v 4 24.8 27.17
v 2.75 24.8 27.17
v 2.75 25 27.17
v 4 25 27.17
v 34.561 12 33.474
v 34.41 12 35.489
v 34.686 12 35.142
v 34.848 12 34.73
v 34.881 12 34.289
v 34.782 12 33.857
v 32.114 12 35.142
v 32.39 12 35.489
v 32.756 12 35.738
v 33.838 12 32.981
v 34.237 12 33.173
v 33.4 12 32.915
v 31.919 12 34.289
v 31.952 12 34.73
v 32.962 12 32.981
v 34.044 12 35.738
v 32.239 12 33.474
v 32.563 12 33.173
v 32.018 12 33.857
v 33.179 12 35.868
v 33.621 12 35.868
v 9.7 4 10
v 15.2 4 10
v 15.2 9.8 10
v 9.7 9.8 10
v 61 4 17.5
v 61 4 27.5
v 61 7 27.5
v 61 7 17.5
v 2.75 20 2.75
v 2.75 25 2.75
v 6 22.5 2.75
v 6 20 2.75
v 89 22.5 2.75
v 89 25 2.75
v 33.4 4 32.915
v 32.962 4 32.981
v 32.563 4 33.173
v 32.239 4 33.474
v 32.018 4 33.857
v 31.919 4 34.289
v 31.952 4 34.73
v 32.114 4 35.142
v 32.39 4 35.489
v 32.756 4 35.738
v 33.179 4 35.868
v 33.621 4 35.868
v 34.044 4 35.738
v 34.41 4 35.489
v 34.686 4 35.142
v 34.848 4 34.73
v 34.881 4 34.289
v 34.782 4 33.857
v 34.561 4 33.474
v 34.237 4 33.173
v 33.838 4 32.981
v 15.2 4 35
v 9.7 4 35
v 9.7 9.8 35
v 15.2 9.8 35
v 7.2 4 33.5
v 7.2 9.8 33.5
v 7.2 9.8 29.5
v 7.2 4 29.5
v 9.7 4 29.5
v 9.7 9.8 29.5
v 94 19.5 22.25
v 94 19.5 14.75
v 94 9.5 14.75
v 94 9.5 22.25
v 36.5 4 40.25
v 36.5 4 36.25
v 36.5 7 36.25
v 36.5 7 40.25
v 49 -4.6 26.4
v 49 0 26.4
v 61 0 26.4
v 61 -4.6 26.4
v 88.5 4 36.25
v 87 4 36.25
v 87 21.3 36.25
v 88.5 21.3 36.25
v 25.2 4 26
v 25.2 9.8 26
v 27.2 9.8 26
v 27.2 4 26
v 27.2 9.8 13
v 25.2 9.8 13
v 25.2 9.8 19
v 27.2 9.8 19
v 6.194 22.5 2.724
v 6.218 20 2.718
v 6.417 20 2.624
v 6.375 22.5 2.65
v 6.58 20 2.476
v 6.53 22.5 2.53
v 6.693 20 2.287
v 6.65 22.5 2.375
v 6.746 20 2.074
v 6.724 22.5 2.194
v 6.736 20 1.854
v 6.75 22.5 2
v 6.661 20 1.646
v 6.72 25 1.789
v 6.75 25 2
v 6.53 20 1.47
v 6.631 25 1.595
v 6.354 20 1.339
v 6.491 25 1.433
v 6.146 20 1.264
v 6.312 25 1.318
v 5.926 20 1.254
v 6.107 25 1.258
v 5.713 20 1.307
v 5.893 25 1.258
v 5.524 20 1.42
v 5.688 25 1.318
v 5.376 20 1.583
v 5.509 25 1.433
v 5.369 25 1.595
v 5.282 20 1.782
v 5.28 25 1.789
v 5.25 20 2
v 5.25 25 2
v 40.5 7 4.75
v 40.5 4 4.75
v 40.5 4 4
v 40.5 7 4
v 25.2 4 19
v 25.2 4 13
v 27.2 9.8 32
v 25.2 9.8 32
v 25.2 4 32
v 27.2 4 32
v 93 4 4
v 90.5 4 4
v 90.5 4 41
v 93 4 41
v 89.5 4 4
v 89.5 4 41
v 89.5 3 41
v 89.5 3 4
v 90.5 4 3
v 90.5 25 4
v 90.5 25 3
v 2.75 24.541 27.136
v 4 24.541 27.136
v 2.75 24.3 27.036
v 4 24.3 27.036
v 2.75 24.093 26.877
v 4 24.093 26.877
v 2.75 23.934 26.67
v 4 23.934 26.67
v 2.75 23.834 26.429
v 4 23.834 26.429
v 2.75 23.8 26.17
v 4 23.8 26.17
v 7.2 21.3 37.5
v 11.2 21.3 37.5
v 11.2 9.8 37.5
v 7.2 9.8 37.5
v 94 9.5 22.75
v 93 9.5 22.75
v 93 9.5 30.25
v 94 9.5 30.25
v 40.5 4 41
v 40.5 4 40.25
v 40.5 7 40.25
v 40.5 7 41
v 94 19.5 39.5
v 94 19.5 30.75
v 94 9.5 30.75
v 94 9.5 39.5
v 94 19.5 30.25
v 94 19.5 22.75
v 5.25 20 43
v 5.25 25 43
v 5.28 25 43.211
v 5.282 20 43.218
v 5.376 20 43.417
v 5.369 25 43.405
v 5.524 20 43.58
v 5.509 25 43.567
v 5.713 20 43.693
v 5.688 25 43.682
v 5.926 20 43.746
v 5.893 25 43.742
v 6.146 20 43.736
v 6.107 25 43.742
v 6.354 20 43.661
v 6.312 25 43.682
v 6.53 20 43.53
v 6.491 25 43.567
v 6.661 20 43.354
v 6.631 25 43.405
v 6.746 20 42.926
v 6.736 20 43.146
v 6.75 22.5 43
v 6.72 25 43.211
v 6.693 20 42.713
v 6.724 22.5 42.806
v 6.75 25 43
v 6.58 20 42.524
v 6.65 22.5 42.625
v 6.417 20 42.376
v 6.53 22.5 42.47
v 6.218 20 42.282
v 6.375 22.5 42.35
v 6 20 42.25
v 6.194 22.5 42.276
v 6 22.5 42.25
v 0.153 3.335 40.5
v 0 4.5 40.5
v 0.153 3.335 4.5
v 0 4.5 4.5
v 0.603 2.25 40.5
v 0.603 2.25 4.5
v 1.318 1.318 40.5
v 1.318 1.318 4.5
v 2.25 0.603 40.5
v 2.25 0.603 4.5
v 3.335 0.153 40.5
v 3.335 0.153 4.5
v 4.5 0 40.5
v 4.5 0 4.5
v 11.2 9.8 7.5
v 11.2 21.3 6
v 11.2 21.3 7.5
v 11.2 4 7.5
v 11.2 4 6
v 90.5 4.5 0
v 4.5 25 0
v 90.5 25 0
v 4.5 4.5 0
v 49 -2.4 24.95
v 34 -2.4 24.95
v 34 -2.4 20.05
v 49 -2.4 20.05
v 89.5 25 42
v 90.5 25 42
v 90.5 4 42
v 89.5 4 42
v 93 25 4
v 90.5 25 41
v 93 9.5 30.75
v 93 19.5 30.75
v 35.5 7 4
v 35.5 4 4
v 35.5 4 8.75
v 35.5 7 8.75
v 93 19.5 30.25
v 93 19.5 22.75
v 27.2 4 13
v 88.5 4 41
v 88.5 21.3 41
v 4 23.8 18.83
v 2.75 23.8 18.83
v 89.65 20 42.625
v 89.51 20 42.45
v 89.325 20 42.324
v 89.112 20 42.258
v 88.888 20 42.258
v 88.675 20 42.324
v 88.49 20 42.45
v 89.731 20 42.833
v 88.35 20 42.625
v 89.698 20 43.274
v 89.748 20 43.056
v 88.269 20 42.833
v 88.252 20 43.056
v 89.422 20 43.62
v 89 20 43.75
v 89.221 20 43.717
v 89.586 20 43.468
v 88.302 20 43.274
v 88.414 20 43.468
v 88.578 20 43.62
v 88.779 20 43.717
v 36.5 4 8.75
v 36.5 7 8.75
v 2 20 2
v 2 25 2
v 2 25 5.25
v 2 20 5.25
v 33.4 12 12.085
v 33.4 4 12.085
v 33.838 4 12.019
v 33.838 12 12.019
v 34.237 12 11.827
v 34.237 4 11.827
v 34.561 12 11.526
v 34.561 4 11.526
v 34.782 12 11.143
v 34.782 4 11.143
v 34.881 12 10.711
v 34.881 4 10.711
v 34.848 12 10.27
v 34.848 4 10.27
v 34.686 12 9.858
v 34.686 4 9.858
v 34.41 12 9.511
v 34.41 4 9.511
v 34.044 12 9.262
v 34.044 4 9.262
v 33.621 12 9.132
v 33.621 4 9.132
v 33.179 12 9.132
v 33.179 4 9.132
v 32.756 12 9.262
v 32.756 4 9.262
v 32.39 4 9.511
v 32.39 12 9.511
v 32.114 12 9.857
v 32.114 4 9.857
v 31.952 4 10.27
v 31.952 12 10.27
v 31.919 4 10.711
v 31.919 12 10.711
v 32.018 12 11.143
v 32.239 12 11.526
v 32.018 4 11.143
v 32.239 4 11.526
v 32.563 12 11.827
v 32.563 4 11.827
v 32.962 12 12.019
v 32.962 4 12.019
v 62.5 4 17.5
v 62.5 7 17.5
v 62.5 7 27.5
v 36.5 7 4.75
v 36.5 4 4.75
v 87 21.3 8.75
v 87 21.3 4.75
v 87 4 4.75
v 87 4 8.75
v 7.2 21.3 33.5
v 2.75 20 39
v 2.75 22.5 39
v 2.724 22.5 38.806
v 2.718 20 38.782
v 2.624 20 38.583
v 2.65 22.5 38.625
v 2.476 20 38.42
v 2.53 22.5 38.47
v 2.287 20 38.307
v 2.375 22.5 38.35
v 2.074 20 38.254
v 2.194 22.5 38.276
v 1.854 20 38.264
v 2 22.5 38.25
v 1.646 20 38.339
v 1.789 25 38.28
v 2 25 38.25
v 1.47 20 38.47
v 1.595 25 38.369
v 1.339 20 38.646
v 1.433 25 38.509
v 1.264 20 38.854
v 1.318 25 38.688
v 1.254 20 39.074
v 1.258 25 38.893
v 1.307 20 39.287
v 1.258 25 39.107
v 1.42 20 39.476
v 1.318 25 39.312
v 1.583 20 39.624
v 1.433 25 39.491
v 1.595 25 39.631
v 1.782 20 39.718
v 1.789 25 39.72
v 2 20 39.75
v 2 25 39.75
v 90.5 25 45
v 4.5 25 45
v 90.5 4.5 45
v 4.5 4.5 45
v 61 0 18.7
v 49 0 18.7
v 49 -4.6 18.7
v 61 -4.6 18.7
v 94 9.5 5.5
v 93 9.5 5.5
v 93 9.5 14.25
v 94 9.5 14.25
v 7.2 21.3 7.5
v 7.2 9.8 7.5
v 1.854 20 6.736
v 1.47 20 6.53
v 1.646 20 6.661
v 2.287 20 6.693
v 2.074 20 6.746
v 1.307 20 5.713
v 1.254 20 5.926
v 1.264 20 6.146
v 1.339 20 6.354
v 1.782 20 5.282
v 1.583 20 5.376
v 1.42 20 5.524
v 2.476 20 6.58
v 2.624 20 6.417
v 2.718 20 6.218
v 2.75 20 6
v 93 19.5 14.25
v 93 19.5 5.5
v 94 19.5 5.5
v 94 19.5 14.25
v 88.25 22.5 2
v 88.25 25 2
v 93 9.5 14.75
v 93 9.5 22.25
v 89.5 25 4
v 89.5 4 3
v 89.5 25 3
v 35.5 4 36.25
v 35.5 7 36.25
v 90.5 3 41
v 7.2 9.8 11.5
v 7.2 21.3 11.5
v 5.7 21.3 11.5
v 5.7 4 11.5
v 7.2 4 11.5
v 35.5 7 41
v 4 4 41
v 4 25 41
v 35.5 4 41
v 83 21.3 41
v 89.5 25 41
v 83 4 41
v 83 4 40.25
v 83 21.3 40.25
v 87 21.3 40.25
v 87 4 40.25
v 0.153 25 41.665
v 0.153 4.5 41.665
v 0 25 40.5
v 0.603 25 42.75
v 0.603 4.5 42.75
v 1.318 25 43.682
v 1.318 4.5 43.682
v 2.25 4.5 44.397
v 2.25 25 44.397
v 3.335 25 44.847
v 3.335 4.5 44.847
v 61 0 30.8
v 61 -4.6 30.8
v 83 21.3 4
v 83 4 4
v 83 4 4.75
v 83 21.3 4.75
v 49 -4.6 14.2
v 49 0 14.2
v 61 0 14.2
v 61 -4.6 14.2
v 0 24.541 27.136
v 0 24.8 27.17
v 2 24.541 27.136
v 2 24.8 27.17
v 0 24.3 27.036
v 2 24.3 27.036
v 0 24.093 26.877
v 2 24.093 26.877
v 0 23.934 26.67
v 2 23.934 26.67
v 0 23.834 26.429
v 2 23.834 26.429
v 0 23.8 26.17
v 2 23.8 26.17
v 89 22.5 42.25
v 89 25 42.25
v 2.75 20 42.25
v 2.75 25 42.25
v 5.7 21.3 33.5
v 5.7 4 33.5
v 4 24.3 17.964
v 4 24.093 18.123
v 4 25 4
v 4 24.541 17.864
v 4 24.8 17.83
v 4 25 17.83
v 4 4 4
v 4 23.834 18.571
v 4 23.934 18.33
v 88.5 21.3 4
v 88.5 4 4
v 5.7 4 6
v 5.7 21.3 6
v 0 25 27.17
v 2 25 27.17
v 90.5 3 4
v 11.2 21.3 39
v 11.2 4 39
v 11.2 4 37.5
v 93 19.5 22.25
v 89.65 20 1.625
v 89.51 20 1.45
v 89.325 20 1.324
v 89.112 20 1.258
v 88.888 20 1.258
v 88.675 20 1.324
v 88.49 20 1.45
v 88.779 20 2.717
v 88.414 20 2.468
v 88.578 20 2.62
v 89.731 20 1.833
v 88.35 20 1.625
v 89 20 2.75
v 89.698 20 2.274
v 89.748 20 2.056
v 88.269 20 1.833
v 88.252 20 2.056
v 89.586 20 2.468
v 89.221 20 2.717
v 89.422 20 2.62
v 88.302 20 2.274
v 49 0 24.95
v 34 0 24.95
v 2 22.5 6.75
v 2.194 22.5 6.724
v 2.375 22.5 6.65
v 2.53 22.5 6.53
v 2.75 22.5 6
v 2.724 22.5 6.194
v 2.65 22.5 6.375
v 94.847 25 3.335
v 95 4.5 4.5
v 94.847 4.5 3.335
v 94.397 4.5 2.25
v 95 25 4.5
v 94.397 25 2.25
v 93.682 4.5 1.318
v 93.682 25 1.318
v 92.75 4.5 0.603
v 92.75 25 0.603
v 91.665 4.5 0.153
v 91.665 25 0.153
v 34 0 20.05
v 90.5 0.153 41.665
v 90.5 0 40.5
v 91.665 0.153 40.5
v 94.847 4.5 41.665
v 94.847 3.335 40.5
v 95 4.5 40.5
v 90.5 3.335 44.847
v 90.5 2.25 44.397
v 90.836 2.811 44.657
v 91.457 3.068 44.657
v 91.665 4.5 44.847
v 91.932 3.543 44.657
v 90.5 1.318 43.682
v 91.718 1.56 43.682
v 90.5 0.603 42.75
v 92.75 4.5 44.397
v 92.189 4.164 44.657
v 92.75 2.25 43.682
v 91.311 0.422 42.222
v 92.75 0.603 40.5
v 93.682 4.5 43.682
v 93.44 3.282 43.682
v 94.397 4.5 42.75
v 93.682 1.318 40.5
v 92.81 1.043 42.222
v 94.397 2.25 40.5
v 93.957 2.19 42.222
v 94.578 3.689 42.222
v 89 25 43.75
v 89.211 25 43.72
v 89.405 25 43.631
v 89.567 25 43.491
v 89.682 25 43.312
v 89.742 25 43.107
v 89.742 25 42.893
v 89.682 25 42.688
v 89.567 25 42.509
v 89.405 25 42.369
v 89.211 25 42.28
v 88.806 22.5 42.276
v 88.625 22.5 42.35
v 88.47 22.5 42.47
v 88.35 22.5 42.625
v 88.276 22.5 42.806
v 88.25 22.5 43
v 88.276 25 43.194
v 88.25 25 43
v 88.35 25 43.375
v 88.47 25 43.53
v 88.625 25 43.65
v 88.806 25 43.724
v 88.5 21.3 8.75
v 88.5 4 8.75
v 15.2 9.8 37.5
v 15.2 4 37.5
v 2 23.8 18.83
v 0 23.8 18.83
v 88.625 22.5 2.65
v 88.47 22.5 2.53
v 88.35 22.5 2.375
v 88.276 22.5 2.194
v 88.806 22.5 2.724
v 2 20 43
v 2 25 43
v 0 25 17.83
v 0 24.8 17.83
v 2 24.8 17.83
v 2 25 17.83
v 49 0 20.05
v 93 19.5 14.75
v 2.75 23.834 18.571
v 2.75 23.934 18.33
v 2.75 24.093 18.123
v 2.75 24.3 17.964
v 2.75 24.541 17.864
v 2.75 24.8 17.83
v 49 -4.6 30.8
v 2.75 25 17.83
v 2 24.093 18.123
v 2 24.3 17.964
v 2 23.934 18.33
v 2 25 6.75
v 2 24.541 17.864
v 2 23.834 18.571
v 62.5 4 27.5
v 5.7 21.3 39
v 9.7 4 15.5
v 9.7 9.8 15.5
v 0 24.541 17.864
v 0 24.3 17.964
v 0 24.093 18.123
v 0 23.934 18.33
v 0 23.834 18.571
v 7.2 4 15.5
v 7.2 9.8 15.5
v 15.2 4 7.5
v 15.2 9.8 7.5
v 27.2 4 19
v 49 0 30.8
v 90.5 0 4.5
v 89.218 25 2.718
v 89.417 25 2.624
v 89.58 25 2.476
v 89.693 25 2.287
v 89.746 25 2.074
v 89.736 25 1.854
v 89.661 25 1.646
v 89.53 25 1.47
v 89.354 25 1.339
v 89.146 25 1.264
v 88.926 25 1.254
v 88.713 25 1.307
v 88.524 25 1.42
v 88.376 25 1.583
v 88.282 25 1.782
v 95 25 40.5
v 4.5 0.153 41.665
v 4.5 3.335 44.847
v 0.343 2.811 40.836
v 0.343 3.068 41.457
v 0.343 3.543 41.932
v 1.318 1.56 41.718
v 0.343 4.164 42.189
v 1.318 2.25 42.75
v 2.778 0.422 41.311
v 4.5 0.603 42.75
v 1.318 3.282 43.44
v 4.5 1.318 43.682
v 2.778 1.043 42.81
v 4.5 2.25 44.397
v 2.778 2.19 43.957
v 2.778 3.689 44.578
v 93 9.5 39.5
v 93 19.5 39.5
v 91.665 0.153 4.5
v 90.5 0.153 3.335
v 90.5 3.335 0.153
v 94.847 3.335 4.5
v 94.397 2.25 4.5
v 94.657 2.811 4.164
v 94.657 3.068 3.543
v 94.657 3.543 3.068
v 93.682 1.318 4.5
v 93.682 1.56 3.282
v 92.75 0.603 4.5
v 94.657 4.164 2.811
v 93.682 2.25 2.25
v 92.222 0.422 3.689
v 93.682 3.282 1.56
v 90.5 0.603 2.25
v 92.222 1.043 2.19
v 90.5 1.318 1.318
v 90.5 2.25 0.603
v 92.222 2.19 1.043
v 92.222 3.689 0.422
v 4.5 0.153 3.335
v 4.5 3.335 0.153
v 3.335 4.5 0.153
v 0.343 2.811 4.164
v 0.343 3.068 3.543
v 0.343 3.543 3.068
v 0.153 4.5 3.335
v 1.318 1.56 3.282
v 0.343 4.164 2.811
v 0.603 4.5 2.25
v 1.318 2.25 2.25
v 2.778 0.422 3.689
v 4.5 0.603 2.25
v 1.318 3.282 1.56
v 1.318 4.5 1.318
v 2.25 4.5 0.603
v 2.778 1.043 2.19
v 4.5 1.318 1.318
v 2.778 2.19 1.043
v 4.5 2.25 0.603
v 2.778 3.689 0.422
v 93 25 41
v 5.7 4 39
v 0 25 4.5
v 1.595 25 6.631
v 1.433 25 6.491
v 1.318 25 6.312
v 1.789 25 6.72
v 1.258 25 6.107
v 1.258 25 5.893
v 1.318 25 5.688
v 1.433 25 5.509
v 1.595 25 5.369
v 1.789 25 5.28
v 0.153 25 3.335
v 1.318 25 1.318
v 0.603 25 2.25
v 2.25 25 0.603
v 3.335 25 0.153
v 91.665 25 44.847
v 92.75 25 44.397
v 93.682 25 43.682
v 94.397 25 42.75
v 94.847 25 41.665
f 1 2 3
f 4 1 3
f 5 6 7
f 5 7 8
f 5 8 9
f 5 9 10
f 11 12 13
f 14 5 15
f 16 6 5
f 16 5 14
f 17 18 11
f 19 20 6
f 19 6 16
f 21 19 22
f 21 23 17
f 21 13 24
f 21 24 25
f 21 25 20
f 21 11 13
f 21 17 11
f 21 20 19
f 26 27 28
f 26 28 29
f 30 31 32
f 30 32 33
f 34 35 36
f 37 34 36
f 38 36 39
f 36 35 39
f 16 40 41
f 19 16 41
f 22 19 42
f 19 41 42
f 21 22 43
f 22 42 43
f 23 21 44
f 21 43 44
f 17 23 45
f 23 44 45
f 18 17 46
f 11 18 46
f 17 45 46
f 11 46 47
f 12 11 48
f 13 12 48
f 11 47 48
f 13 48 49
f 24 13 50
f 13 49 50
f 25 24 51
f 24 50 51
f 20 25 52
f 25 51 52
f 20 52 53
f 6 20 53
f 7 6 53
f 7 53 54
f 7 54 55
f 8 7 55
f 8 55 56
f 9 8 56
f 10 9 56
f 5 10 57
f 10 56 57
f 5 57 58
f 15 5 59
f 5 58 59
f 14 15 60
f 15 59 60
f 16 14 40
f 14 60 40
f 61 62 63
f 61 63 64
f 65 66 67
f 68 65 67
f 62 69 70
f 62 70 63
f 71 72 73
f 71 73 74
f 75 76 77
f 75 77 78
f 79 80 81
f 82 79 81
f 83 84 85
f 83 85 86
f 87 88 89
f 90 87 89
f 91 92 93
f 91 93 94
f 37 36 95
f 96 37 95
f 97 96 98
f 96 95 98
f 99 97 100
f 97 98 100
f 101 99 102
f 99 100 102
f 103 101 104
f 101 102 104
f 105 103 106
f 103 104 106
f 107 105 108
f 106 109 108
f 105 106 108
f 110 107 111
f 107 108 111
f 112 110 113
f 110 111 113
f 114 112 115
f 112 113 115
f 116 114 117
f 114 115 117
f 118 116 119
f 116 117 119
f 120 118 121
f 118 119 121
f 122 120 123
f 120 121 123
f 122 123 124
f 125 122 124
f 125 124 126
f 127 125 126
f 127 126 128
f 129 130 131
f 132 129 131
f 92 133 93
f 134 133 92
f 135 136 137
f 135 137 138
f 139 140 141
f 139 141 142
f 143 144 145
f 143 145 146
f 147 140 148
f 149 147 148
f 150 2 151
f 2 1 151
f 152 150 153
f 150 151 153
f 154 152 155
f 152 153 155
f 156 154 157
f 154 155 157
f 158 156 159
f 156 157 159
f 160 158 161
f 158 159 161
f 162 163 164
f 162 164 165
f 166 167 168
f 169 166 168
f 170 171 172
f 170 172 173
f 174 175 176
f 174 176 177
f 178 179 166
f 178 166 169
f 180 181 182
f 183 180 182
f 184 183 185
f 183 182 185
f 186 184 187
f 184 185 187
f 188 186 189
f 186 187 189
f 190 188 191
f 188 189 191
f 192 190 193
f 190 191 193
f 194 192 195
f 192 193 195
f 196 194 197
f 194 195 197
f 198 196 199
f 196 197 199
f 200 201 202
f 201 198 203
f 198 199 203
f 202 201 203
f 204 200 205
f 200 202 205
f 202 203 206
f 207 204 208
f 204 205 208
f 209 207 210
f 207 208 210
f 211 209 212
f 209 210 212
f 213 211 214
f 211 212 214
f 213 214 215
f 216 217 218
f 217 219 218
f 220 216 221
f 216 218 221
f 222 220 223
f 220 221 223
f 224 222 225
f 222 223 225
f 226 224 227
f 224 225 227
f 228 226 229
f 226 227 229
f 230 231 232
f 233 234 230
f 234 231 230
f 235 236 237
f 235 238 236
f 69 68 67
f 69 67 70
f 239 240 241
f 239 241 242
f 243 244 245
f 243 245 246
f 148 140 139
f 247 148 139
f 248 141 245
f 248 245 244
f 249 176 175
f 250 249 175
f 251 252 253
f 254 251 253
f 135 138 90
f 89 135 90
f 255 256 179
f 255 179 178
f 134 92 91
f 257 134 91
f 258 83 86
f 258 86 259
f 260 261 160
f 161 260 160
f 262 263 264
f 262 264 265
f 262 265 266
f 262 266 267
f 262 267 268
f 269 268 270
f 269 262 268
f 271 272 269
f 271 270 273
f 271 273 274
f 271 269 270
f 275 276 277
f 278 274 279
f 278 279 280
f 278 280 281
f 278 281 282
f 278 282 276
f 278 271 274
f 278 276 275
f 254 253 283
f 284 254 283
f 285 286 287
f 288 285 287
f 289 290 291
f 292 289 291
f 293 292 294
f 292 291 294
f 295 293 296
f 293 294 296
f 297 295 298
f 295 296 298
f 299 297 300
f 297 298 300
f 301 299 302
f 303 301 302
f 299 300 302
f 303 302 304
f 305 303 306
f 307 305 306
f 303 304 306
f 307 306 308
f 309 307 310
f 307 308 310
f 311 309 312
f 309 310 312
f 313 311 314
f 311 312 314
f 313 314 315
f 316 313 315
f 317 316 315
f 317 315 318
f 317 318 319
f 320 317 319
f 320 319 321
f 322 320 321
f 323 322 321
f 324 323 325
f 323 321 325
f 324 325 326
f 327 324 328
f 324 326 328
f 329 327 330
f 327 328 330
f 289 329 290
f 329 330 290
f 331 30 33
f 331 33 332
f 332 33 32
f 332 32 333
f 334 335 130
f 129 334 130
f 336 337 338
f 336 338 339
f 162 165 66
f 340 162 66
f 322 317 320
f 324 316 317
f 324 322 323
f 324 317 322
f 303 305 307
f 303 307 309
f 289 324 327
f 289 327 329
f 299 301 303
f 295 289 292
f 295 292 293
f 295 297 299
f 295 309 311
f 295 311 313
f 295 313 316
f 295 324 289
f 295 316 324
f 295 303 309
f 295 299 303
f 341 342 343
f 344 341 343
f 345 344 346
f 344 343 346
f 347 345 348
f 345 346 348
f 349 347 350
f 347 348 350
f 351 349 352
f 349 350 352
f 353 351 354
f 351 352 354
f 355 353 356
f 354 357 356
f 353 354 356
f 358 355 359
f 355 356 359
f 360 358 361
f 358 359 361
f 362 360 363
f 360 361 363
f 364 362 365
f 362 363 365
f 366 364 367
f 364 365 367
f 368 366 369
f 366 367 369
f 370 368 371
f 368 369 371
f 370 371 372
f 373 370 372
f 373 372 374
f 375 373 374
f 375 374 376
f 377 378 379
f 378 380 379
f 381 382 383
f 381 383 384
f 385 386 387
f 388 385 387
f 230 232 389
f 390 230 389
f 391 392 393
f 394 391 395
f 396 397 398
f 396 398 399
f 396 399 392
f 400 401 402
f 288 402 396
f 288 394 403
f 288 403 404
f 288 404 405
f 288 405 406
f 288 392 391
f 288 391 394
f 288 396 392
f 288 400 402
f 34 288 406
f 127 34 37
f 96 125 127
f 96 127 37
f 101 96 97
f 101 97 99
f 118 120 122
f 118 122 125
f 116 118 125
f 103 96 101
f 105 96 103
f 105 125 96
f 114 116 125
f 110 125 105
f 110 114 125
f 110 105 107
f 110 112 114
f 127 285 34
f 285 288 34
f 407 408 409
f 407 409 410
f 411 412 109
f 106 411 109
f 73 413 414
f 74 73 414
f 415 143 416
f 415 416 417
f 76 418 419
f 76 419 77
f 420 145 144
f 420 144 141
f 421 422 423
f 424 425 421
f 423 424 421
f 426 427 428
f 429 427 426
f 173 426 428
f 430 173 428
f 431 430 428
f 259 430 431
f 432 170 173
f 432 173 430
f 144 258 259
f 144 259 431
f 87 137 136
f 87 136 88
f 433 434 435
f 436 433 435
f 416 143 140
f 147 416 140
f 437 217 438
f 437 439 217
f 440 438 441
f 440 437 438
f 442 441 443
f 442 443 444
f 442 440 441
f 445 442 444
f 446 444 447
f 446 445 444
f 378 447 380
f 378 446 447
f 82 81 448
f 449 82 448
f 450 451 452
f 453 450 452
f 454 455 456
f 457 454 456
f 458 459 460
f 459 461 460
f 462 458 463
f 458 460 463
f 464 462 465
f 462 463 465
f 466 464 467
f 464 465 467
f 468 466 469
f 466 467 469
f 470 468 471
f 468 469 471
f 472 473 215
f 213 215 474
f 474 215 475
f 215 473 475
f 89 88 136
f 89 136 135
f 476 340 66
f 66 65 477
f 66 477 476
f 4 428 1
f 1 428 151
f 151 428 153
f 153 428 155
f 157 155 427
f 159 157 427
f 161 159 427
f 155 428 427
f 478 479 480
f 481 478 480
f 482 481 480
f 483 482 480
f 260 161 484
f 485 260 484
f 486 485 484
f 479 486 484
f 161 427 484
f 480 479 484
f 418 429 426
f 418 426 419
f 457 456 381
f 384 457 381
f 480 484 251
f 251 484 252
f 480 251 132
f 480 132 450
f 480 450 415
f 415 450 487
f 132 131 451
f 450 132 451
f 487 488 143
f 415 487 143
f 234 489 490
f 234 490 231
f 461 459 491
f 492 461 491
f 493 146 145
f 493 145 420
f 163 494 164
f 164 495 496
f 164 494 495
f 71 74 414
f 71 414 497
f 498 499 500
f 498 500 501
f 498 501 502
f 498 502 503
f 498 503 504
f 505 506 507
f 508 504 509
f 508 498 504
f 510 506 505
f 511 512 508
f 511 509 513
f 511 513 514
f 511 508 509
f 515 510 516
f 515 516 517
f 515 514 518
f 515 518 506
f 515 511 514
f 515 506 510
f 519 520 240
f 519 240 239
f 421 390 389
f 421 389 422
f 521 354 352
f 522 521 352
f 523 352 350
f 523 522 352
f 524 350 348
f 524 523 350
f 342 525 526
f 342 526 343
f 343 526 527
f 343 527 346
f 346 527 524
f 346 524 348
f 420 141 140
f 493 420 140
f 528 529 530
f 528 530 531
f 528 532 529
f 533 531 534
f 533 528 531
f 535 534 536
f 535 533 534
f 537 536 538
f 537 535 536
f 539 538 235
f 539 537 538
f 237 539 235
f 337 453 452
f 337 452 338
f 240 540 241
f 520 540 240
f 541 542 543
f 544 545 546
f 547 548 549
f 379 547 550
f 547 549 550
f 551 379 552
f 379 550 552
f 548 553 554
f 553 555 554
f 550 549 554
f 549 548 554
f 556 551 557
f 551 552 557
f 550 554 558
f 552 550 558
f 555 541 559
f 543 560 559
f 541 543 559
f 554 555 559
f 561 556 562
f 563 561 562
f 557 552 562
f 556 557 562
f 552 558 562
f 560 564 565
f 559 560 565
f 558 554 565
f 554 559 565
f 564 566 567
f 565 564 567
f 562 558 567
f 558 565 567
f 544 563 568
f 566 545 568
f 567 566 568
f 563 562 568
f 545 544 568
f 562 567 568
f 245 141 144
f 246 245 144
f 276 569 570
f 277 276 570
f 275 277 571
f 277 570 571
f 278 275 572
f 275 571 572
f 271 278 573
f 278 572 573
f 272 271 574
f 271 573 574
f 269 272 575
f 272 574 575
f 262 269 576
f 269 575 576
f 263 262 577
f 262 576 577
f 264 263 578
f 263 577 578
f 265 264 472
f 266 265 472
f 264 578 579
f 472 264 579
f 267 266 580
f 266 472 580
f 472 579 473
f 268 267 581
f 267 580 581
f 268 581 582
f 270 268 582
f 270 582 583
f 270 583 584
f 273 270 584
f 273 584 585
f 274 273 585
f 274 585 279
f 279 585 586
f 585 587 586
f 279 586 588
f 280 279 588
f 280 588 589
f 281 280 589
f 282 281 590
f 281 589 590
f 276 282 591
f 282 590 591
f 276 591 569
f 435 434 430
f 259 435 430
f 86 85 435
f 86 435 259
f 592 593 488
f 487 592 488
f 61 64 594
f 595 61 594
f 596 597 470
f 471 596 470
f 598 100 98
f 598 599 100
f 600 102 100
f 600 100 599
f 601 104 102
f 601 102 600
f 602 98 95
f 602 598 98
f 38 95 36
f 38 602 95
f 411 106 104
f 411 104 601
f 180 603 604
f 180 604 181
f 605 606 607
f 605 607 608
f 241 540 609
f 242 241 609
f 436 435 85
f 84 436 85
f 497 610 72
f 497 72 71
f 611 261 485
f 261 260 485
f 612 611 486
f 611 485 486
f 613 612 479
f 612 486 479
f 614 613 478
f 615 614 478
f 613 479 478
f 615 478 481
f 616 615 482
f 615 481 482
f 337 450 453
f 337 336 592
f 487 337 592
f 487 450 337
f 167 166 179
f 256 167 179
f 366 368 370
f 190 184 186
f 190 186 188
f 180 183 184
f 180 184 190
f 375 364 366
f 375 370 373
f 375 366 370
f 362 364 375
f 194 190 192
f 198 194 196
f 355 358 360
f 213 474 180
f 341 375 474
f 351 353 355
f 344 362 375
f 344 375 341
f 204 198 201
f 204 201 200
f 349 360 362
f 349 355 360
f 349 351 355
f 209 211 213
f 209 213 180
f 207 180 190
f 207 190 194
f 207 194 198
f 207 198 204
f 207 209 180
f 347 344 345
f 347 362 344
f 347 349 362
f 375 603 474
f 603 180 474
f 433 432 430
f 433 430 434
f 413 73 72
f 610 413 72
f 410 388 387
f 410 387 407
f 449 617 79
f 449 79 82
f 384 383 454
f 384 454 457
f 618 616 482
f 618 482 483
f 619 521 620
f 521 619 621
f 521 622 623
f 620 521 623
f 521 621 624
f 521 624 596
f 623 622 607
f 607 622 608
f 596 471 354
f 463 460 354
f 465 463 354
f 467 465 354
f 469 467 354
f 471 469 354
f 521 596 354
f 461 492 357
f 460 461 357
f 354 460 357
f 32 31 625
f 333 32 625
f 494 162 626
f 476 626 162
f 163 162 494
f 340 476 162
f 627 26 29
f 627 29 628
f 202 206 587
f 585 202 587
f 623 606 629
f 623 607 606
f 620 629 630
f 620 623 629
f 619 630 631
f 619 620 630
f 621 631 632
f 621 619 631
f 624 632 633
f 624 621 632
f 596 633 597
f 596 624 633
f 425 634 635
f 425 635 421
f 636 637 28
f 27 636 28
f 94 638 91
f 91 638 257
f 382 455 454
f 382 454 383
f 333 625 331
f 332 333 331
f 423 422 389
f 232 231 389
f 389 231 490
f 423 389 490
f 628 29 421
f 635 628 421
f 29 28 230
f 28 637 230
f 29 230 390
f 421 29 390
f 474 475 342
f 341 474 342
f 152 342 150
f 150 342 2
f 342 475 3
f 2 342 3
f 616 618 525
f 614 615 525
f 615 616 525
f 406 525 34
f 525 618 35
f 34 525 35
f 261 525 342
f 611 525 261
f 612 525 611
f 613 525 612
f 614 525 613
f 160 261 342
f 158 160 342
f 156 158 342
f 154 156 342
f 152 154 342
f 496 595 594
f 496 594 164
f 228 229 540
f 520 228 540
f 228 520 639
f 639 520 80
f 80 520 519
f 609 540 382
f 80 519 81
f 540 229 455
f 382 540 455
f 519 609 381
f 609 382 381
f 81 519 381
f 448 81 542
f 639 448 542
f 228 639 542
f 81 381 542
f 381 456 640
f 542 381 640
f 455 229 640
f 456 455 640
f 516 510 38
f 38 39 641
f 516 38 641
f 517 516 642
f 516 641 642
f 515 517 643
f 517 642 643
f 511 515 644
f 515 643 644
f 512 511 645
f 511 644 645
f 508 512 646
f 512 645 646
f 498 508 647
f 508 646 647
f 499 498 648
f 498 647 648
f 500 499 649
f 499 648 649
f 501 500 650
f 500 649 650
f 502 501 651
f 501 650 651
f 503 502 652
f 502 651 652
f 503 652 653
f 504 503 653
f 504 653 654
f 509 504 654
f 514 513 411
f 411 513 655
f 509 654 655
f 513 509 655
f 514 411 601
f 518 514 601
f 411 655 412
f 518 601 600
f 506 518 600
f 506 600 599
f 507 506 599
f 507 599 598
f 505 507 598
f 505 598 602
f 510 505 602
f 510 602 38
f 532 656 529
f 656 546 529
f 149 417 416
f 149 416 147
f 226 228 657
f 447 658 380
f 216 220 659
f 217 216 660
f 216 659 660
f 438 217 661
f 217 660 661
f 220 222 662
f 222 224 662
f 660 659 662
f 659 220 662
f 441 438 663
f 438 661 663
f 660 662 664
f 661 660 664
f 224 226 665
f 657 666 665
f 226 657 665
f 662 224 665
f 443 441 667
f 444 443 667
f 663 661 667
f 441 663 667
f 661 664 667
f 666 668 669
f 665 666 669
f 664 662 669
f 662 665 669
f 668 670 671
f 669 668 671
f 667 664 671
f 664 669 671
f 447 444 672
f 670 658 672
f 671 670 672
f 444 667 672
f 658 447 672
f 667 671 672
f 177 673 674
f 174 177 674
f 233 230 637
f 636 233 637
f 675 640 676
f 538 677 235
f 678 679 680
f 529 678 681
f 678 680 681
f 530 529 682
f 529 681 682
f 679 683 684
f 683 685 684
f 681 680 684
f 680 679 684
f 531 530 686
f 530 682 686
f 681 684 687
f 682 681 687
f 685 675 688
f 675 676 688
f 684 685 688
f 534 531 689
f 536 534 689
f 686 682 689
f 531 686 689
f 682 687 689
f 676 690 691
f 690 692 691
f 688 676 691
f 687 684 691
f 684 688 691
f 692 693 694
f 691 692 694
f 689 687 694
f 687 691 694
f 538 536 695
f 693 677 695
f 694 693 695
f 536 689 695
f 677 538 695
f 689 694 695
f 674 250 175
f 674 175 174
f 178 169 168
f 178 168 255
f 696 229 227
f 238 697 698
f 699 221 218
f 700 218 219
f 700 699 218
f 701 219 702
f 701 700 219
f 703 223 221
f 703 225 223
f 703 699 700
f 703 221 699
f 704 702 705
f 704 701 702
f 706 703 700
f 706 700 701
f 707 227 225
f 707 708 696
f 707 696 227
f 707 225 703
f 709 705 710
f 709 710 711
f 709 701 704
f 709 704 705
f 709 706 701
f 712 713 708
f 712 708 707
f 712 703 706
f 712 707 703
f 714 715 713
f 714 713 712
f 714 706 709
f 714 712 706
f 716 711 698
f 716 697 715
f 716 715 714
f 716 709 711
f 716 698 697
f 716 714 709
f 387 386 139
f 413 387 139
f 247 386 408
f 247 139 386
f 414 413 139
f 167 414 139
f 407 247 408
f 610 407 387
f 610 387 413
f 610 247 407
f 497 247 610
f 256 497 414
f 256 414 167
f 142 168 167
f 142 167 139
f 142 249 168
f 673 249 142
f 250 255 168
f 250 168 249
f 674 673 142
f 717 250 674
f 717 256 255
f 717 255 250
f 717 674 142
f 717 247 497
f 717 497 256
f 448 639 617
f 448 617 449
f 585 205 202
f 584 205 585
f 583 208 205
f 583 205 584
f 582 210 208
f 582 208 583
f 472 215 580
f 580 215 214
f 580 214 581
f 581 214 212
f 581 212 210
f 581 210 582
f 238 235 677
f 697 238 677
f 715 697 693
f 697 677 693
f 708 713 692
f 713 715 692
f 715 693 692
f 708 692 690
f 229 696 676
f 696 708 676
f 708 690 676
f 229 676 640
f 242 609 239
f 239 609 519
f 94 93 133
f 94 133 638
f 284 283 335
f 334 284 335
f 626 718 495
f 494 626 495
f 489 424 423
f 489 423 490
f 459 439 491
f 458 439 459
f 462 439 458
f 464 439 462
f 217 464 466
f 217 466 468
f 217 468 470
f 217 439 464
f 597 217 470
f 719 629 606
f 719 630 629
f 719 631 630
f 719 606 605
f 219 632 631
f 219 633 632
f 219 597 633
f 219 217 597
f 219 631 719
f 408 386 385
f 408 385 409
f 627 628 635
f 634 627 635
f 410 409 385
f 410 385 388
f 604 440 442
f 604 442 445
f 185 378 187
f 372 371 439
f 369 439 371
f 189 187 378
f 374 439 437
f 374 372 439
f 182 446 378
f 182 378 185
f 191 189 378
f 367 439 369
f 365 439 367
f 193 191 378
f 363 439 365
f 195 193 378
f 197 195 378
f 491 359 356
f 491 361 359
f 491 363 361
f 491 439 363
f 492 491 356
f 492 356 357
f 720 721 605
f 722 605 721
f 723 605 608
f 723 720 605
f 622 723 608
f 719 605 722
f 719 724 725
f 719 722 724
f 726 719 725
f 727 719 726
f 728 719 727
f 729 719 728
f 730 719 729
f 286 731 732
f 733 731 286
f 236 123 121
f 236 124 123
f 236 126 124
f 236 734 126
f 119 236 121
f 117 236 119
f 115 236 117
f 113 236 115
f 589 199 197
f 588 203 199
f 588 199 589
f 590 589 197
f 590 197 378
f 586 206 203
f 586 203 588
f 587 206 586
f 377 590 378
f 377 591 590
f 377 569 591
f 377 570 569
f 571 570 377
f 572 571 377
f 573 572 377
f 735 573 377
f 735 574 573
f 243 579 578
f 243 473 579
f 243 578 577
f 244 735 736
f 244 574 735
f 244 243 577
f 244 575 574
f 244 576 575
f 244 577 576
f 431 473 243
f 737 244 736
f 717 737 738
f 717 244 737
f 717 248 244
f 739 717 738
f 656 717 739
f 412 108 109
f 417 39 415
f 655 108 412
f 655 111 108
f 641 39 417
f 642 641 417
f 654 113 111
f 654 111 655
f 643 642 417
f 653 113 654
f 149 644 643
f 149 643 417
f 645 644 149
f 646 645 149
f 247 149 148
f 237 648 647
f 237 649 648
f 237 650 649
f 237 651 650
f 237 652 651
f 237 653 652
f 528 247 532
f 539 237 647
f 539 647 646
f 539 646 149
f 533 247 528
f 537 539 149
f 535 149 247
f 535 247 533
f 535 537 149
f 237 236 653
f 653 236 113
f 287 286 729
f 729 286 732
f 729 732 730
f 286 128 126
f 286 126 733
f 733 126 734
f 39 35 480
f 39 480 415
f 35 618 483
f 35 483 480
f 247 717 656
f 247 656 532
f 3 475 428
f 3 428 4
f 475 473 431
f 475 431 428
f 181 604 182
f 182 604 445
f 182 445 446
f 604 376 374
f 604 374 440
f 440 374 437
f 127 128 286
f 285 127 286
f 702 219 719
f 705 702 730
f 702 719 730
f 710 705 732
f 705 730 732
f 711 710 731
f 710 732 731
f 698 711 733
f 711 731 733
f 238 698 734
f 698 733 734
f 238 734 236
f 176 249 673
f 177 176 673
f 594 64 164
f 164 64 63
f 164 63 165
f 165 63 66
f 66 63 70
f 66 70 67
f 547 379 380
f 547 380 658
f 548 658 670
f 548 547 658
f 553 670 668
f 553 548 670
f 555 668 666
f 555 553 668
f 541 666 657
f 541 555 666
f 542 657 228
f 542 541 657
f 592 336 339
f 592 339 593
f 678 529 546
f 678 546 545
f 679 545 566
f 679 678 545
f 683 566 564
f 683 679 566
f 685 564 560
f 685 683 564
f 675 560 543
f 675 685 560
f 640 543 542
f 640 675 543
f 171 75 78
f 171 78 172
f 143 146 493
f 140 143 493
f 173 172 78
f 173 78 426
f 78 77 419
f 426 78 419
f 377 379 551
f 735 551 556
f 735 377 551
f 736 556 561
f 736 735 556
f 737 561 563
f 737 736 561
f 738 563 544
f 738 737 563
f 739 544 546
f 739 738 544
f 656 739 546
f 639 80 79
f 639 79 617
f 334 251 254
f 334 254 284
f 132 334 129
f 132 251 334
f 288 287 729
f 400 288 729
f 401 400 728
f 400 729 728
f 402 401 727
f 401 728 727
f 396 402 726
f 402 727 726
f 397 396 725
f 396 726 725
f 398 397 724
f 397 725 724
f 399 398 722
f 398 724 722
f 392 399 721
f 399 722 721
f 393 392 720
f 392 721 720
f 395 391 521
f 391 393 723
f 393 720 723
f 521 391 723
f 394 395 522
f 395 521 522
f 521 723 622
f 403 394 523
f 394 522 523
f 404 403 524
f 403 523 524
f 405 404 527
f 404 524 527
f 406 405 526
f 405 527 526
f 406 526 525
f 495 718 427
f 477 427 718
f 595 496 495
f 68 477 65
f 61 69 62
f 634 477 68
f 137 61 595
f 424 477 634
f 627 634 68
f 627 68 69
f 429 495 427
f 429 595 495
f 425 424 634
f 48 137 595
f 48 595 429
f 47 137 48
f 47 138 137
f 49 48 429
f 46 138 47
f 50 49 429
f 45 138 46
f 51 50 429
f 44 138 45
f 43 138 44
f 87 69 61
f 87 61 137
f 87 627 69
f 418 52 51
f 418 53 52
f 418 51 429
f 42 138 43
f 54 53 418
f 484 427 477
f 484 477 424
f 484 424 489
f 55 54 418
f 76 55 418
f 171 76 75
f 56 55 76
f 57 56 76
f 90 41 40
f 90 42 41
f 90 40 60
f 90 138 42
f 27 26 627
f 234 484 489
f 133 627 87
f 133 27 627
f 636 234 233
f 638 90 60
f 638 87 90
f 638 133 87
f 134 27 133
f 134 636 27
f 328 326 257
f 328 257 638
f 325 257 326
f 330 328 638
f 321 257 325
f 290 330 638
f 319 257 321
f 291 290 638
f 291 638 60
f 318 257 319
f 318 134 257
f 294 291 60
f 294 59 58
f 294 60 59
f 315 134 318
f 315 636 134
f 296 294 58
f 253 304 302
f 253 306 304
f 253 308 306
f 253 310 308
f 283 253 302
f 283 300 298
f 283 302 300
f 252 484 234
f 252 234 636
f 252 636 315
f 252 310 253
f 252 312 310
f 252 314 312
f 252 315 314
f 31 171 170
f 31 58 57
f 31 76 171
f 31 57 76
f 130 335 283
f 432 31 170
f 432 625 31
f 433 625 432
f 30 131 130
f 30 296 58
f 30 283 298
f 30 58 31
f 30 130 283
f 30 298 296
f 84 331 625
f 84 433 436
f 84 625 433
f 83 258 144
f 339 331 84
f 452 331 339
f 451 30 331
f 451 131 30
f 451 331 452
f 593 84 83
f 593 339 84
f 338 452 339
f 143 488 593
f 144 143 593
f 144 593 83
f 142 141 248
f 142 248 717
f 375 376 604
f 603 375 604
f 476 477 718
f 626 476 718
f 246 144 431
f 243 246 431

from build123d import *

# Parameters (mm, degrees)
SKETCH_1_W           = 95
SKETCH_1_H           = 45
EXTRUDE_1_DEPTH      = 25
SHELL_1_T            = -4
FILLET_1_R           = 4.5
SKETCH_2_R           = 0.75
CUT_EXTRUDE_1_DEPTH  = 5
CUT_EXTRUDE_3_DEPTH  = 2.5
SKETCH_8_W           = 34
SKETCH_8_H           = 10
CUT_EXTRUDE_4_DEPTH  = 3
SKETCH_9_W           = 37
SKETCH_9_H           = 21
CUT_EXTRUDE_7_DEPTH  = 2
SKETCH_7_W           = 1
SKETCH_7_H           = 37
CUT_EXTRUDE_8_DEPTH  = 1
SKETCH_11_W          = 1
SKETCH_11_H          = 21
CUT_EXTRUDE_10_DEPTH = 1
SKETCH_12_W          = 1
SKETCH_12_H          = 21
CUT_EXTRUDE_11_DEPTH = 1
SKETCH_15_W          = 0.5
SKETCH_15_H          = 10
EXTRUDE_2_DEPTH      = 1
SKETCH_17_W          = 1.5
SKETCH_17_H          = 10
EXTRUDE_3_DEPTH      = 3
SKETCH_18_R          = 1.485
EXTRUDE_4_DEPTH      = 8
SKETCH_19_W          = 9.34
SKETCH_19_H          = 1.2
CUT_EXTRUDE_12_DEPTH = 10
FILLET_2_R           = 1
FILLET_3_R           = 1
FILLET_4_R           = 1
FILLET_5_R           = 1
SKETCH_20_W          = 2
SKETCH_20_H          = 6
EXTRUDE_5_DEPTH      = 5.8
EXTRUDE_6_DEPTH      = 17.3
EXTRUDE_7_DEPTH      = 14.3
SKETCH_26_W          = 15
SKETCH_26_H          = 4.9
EXTRUDE_8_DEPTH      = 2.4
SKETCH_27_W          = 12
SKETCH_27_H          = 4.4
SKETCH_27_H_2        = 4.5
EXTRUDE_9_DEPTH      = 4.6


with BuildPart() as part:
    # Эскиз1 → Бобышка-Вытянуть1 (new body)
    with BuildSketch(Plane(origin=(0, 0, 0), x_dir=(1, 0, 0), z_dir=(0, 1, 0))):
        with Locations((47.5, -22.5)):
            Rectangle(SKETCH_1_W, SKETCH_1_H)
    extrude(amount=EXTRUDE_1_DEPTH)

    # Оболочка1
    shell_1_openings = [part.faces().sort_by_distance(p)[0] for p in [
        (47.5, 25, 22.5),
    ]]
    offset(amount=SHELL_1_T, openings=shell_1_openings, kind=Kind.INTERSECTION)

    # Скругление1
    fillet_1_edges = [part.edges().sort_by_distance(p)[0] for p in [
        (47.5, 0, 0),
        (95, 0, 22.5),
        (47.5, 0, 45),
        (0, 0, 22.5),
        (0, 12.5, 0),
        (95, 12.5, 0),
        (95, 12.5, 45),
        (0, 12.5, 45),
    ]]
    fillet(fillet_1_edges, radius=FILLET_1_R)

    # Эскиз2 → Вырез-Вытянуть1 (cut)
    with BuildSketch(Plane(origin=(0, 25, 0), x_dir=(1, 0, 0), z_dir=(0, 1, 0))):
        with Locations((6, -2)):
            Circle(SKETCH_2_R)
        with BuildLine():
            ThreePointArc((2, -5.25), (2.530330086, -5.469669914), (2.75, -6))
            Line((2.75, -6), (2.75, -2.75))
            Line((2.75, -2.75), (6, -2.75))
            ThreePointArc((6, -2.75), (5.469669914, -2.530330086), (5.25, -2))
            Line((5.25, -2), (2, -2))
            Line((2, -2), (2, -5.25))
        make_face()
        with Locations((2, -6)):
            Circle(SKETCH_2_R)
        with Locations(Location((89, -43, 0), (0, 0, 270))):
            Circle(SKETCH_2_R)
        with Locations(Location((89, -2, 0), (0, 0, 270))):
            Circle(SKETCH_2_R)
        with Locations((2, -39)):
            Circle(SKETCH_2_R)
        with BuildLine():
            Line((2.75, -42.25), (2.75, -39))
            ThreePointArc((2.75, -39), (2.530330086, -39.530330086), (2, -39.75))
            Line((2, -39.75), (2, -43))
            Line((2, -43), (5.25, -43))
            ThreePointArc((5.25, -43), (5.469669914, -42.469669914), (6, -42.25))
            Line((6, -42.25), (2.75, -42.25))
        make_face()
        with Locations((6, -43)):
            Circle(SKETCH_2_R)
    extrude(amount=-CUT_EXTRUDE_1_DEPTH, mode=Mode.SUBTRACT)

    # Эскиз2<6> → Вырез-Вытянуть3 (cut)
    with BuildSketch(Plane(origin=(0, 25, 0), x_dir=(1, 0, 0), z_dir=(0, 1, 0))):
        with BuildLine():
            Line((2.75, -39), (2.75, -6))
            ThreePointArc((2.75, -6), (2.530330086, -6.530330086), (2, -6.75))
            Line((2, -6.75), (2, -38.25))
            ThreePointArc((2, -38.25), (2.530330086, -38.469669914), (2.75, -39))
        make_face()
        with BuildLine():
            ThreePointArc((6.75, -2), (6.530330086, -2.530330086), (6, -2.75))
            Line((6, -2.75), (89, -2.75))
            ThreePointArc((89, -2.75), (88.469669914, -2.530330086), (88.25, -2))
            Line((88.25, -2), (6.75, -2))
        make_face()
        with BuildLine():
            Line((89, -42.25), (6, -42.25))
            ThreePointArc((6, -42.25), (6.530330086, -42.469669914), (6.75, -43))
            Line((6.75, -43), (88.25, -43))
            ThreePointArc((88.25, -43), (88.469669914, -42.469669914), (89, -42.25))
        make_face()
    extrude(amount=-CUT_EXTRUDE_3_DEPTH, mode=Mode.SUBTRACT)

    # Эскиз8 → Вырез-Вытянуть4 (cut)
    with BuildSketch(Plane.ZY.offset(-91)):
        with Locations((22.5, 14.5)):
            Rectangle(SKETCH_8_W, SKETCH_8_H)
    extrude(amount=-CUT_EXTRUDE_4_DEPTH, mode=Mode.SUBTRACT)

    # Эскиз9 → Вырез-Вытянуть7 (cut)
    with BuildSketch(Plane.ZY.offset(-91)):
        with Locations((22.5, 14.5)):
            Rectangle(SKETCH_9_W, SKETCH_9_H)
    extrude(amount=-CUT_EXTRUDE_7_DEPTH, mode=Mode.SUBTRACT)

    # Эскиз7 → Вырез-Вытянуть8 (cut)
    with BuildSketch(Plane(origin=(0, 4, 0), x_dir=(1, 0, 0), z_dir=(0, 1, 0))):
        with Locations((90, -22.5)):
            Rectangle(SKETCH_7_W, SKETCH_7_H)
    extrude(amount=-CUT_EXTRUDE_8_DEPTH, mode=Mode.SUBTRACT)

    # Эскиз11 → Вырез-Вытянуть10 (cut)
    with BuildSketch(Plane.XY.offset(4)):
        with Locations((90, 14.5)):
            Rectangle(SKETCH_11_W, SKETCH_11_H)
    extrude(amount=-CUT_EXTRUDE_10_DEPTH, mode=Mode.SUBTRACT)

    # Эскиз12 → Вырез-Вытянуть11 (cut)
    with BuildSketch(Plane(origin=(0, 0, 41), x_dir=(-1, 0, 0), z_dir=(0, 0, -1))):
        with Locations((-90, 14.5)):
            Rectangle(SKETCH_12_W, SKETCH_12_H)
    extrude(amount=-CUT_EXTRUDE_11_DEPTH, mode=Mode.SUBTRACT)

    # Эскиз15 → Бобышка-Вытянуть2 (add)
    with BuildSketch(Plane.ZY.offset(-94)):
        with Locations((14.5, 14.5)):
            Rectangle(SKETCH_15_W, SKETCH_15_H)
        with Locations((22.5, 14.5)):
            Rectangle(SKETCH_15_W, SKETCH_15_H)
        with Locations((30.5, 14.5)):
            Rectangle(SKETCH_15_W, SKETCH_15_H)
    extrude(amount=EXTRUDE_2_DEPTH)

    # Эскиз17 → Бобышка-Вытянуть3 (add)
    with BuildSketch(Plane(origin=(0, 4, 0), x_dir=(1, 0, 0), z_dir=(0, 1, 0))):
        with Locations((61.75, -22.5)):
            Rectangle(SKETCH_17_W, SKETCH_17_H)
        Polygon((83, -3.75), (83, -4.75), (87, -4.75), (87, -8.75), (88.5, -8.75), (88.5, -3.75), align=None)
        Polygon((40.5, -3.75), (35.5, -3.75), (35.5, -8.75), (36.5, -8.75), (36.5, -4.75), (40.5, -4.75), align=None)
        Polygon((87, -36.25), (88.5, -36.25), (88.5, -41.25), (83, -41.25), (83, -40.25), (87, -40.25), align=None)
        Polygon((40.5, -40.25), (40.5, -41.25), (35.5, -41.25), (35.5, -36.25), (36.5, -36.25), (36.5, -40.25), align=None)
    extrude(amount=EXTRUDE_3_DEPTH)

    # Эскиз18 → Бобышка-Вытянуть4 (add)
    with BuildSketch(Plane(origin=(0, 4, 0), x_dir=(1, 0, 0), z_dir=(0, 1, 0))):
        with Locations(Location((33.4, -10.6, 0), (0, 0, 270))):
            Circle(SKETCH_18_R)
        with Locations(Location((33.4, -34.4, 0), (0, 0, 90))):
            Circle(SKETCH_18_R)
    extrude(amount=EXTRUDE_4_DEPTH)

    # Эскиз19 → Вырез-Вытянуть12 (cut)
    with BuildSketch(Plane.ZY):
        with Locations((22.5, 24.4)):
            Rectangle(SKETCH_19_W, SKETCH_19_H)
    extrude(amount=-CUT_EXTRUDE_12_DEPTH, mode=Mode.SUBTRACT)

    # Скругление2
    fillet_2_edges = [part.edges().sort_by_distance(p)[0] for p in [
        (1, 23.8, 27.17),
    ]]
    fillet(fillet_2_edges, radius=FILLET_2_R)

    # Скругление3
    fillet_3_edges = [part.edges().sort_by_distance(p)[0] for p in [
        (3.375, 23.8, 27.17),
    ]]
    fillet(fillet_3_edges, radius=FILLET_3_R)

    # Скругление4
    fillet_4_edges = [part.edges().sort_by_distance(p)[0] for p in [
        (3.375, 23.8, 17.83),
    ]]
    fillet(fillet_4_edges, radius=FILLET_4_R)

    # Скругление5
    fillet_5_edges = [part.edges().sort_by_distance(p)[0] for p in [
        (1, 23.8, 17.83),
    ]]
    fillet(fillet_5_edges, radius=FILLET_5_R)

    # Эскиз20 → Бобышка-Вытянуть5 (add)
    with BuildSketch(Plane(origin=(0, 4, 0), x_dir=(1, 0, 0), z_dir=(0, 1, 0))):
        Polygon((15.2, -10), (9.7, -10), (9.7, -15.5), (7.2, -15.5), (7.2, -7.5), (15.2, -7.5), align=None)
        Polygon((9.7, -29.5), (9.7, -35), (15.2, -35), (15.2, -37.5), (7.2, -37.5), (7.2, -29.5), align=None)
        with Locations((26.2, -16)):
            Rectangle(SKETCH_20_W, SKETCH_20_H)
        with Locations((26.2, -29)):
            Rectangle(SKETCH_20_W, SKETCH_20_H)
    extrude(amount=EXTRUDE_5_DEPTH)

    # Эскиз22 → Бобышка-Вытянуть6 (add)
    with BuildSketch(Plane(origin=(0, 4, 0), x_dir=(1, 0, 0), z_dir=(0, 1, 0))):
        Polygon((7.2, -7.5), (7.2, -11.5), (5.7, -11.5), (5.7, -6), (11.2, -6), (11.2, -7.5), align=None)
        Polygon((7.2, -33.5), (5.7, -33.5), (5.7, -39), (11.2, -39), (11.2, -37.5), (7.2, -37.5), align=None)
    extrude(amount=EXTRUDE_6_DEPTH)

    # Эскиз25 → Бобышка-Вытянуть7 (add)
    with BuildSketch(Plane(origin=(0, 7, 0), x_dir=(1, 0, 0), z_dir=(0, 1, 0))):
        Polygon((83, -4), (83, -4.75), (87, -4.75), (87, -8.75), (88.5, -8.75), (88.5, -4), align=None)
        Polygon((83, -40.25), (83, -41), (88.5, -41), (88.5, -36.25), (87, -36.25), (87, -40.25), align=None)
    extrude(amount=EXTRUDE_7_DEPTH)

    # Эскиз26 → Бобышка-Вытянуть8 (add)
    with BuildSketch(Plane.XZ):
        with Locations((41.5, 22.5)):
            Rectangle(SKETCH_26_W, SKETCH_26_H)
    extrude(amount=EXTRUDE_8_DEPTH)

    # Эскиз27 → Бобышка-Вытянуть9 (add)
    with BuildSketch(Plane.XZ):
        with Locations((55, 28.6)):
            Rectangle(SKETCH_27_W, SKETCH_27_H)
        with Locations((55, 16.45)):
            Rectangle(SKETCH_27_W, SKETCH_27_H_2)
    extrude(amount=EXTRUDE_9_DEPTH)


solid = part.part
